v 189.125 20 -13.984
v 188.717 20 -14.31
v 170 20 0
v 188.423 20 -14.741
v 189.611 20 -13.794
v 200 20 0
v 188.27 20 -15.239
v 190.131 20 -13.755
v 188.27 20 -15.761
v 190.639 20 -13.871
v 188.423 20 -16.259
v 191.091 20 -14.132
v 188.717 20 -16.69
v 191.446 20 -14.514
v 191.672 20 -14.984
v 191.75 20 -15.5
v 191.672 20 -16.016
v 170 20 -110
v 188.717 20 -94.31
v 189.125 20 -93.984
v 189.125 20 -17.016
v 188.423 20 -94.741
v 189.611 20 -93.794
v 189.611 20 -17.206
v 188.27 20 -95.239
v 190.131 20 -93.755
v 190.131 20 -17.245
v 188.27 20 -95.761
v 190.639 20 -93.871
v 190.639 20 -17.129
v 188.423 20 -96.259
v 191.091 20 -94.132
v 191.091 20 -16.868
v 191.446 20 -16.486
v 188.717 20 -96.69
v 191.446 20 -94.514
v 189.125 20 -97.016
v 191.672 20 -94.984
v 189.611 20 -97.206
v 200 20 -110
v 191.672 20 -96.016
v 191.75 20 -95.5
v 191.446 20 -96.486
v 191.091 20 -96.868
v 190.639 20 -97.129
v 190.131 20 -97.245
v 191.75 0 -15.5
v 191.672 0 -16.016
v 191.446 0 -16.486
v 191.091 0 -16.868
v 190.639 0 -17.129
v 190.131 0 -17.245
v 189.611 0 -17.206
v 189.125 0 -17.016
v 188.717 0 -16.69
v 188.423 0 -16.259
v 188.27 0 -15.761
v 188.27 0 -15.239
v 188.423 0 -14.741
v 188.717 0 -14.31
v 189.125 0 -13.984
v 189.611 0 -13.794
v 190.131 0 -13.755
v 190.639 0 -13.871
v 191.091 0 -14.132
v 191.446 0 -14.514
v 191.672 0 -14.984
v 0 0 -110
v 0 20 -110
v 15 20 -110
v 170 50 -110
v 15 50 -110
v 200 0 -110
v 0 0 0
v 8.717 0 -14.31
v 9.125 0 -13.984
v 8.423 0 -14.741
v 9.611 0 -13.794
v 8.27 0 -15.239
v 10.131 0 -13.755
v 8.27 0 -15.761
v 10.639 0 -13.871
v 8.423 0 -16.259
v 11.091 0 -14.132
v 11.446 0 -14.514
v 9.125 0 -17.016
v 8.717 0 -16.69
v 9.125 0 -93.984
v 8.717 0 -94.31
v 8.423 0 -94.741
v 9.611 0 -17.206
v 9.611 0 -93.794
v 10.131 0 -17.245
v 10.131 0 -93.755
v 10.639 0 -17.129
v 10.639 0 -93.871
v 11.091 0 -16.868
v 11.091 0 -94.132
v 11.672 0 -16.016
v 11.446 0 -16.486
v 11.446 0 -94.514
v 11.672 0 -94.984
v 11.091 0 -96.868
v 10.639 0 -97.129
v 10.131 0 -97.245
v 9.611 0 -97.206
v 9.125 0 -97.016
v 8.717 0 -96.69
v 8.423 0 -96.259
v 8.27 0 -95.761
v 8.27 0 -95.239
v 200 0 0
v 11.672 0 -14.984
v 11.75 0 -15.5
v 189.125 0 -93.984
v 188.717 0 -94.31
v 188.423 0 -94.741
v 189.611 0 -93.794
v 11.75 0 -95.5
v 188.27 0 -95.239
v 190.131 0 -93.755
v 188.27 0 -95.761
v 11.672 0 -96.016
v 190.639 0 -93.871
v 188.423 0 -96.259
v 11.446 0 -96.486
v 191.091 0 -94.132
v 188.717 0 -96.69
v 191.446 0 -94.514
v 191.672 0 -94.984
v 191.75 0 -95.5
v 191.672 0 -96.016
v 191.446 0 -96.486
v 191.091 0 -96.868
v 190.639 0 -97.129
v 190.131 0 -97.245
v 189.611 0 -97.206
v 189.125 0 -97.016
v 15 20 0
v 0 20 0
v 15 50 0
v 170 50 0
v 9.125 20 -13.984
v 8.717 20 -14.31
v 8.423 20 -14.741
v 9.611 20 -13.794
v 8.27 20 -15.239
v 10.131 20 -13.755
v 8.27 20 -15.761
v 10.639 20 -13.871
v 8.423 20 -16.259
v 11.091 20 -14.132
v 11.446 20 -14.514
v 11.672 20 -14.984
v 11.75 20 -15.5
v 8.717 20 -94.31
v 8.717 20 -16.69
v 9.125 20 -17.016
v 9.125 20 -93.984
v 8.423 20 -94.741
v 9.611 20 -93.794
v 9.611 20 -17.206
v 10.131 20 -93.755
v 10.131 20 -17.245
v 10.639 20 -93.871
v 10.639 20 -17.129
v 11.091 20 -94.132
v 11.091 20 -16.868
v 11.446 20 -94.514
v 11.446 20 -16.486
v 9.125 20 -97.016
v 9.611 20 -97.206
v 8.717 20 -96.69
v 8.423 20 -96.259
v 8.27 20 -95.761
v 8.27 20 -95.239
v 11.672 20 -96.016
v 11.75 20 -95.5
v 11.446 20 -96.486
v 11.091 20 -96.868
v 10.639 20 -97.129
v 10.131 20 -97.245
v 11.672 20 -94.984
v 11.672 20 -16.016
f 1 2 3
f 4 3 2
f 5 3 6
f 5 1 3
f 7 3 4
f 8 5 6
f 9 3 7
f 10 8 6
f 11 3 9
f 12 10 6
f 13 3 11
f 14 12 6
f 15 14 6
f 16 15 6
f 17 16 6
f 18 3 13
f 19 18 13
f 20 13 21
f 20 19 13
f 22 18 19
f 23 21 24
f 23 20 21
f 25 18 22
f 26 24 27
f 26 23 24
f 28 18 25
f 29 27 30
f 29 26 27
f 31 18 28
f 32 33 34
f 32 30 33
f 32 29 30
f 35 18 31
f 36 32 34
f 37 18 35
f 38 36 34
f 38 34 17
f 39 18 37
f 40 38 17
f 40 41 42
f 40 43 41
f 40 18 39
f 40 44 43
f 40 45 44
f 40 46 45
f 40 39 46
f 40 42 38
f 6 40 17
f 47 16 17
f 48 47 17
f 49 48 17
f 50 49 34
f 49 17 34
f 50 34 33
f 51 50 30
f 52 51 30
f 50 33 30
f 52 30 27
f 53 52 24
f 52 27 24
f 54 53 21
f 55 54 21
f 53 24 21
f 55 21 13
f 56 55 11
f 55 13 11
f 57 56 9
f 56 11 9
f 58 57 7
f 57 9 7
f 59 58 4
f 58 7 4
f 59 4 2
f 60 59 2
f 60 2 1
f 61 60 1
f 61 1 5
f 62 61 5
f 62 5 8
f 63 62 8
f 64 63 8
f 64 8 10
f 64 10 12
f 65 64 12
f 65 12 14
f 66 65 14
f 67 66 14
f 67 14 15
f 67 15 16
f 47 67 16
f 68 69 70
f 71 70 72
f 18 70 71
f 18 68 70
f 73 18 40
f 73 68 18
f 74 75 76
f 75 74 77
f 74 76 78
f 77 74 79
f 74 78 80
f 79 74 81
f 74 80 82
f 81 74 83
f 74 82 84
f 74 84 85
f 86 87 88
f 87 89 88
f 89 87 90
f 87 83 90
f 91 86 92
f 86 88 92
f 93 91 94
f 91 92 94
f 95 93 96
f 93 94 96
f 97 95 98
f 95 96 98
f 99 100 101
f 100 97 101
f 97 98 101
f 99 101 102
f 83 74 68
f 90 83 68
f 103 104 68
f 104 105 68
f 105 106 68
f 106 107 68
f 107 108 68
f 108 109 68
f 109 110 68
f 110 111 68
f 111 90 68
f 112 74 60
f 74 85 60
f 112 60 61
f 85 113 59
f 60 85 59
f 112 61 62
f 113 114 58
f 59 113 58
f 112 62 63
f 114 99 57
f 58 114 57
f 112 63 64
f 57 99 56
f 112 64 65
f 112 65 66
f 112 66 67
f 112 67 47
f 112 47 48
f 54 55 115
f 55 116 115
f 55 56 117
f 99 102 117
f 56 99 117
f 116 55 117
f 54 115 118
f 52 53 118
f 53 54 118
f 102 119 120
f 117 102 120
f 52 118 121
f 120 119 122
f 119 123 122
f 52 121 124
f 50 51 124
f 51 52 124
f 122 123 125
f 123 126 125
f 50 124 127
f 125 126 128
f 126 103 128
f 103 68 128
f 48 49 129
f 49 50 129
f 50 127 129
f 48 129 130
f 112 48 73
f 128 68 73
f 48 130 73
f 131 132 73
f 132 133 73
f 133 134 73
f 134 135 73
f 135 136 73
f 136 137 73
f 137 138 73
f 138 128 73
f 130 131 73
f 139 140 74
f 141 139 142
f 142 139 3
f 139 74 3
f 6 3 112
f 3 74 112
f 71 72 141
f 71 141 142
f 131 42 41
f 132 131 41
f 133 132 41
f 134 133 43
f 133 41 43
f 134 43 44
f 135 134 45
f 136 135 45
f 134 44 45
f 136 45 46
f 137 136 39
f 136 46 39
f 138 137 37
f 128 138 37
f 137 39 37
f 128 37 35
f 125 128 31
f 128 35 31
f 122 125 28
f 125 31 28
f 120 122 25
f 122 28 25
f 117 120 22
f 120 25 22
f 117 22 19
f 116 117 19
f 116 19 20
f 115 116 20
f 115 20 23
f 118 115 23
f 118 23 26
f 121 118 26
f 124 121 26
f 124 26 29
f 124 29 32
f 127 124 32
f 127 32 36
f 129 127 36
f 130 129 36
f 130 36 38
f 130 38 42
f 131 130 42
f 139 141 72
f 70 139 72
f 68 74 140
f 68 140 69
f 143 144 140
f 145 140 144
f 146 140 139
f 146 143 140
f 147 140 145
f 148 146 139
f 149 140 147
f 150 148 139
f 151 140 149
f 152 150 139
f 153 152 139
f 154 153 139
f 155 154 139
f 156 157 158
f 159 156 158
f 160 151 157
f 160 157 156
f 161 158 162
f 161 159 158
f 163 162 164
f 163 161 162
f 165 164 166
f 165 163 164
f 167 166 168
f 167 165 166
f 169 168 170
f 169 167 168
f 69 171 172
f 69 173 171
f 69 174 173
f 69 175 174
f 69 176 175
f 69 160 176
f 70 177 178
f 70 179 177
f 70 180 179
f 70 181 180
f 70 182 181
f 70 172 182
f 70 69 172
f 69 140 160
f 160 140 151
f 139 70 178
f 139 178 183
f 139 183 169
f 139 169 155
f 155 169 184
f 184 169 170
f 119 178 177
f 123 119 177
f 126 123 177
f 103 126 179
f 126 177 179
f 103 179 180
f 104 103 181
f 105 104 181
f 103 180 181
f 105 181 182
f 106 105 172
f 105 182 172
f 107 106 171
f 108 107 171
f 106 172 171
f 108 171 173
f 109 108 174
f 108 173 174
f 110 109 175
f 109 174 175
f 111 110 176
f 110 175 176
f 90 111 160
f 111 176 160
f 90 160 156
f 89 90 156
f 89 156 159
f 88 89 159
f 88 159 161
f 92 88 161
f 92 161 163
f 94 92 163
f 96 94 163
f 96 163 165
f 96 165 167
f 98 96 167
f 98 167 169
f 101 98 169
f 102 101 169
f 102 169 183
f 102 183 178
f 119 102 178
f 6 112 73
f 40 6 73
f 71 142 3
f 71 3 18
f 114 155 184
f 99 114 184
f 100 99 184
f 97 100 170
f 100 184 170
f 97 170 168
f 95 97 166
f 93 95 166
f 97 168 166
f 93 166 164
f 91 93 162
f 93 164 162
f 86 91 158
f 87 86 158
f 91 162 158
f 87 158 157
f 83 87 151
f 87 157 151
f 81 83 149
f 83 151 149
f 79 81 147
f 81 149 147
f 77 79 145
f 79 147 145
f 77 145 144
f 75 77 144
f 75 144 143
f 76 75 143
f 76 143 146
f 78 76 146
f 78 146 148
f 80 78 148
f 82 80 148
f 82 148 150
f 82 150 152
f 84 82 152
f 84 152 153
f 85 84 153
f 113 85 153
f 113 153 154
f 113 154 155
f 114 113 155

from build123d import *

# Parameters (mm, degrees)
SKETCH1_W           = 200
SKETCH1_H           = 110
BOSS_EXTRUDE1_DEPTH = 50
SKETCH2_W           = 30
SKETCH2_H           = 110
SKETCH2_W_2         = 15
CUT_EXTRUDE1_DEPTH  = 30
SKETCH3_R           = 1.75
CUT_EXTRUDE2_DEPTH  = 30


with BuildPart() as part:
    # Sketch1 → Boss-Extrude1 (new body)
    with BuildSketch(Plane(origin=(0, 0, 0), x_dir=(1, 0, 0), z_dir=(0, 1, 0))):
        with Locations((100, 55)):
            Rectangle(SKETCH1_W, SKETCH1_H)
    extrude(amount=BOSS_EXTRUDE1_DEPTH)

    # Sketch2 → Cut-Extrude1 (cut)
    with BuildSketch(Plane(origin=(0, 50, 0), x_dir=(1, 0, 0), z_dir=(0, 1, 0))):
        with Locations((185, 55)):
            Rectangle(SKETCH2_W, SKETCH2_H)
        with Locations((7.5, 55)):
            Rectangle(SKETCH2_W_2, SKETCH2_H)
    extrude(amount=-CUT_EXTRUDE1_DEPTH, mode=Mode.SUBTRACT)

    # Sketch3 → Cut-Extrude2 (cut)
    with BuildSketch(Plane(origin=(0, 20, 0), x_dir=(1, 0, 0), z_dir=(0, 1, 0))):
        with Locations((190, 95.5)):
            Circle(SKETCH3_R)
        with Locations((190, 15.5)):
            Circle(SKETCH3_R)
        with Locations((10, 95.5)):
            Circle(SKETCH3_R)
        with Locations((10, 15.5)):
            Circle(SKETCH3_R)
    extrude(amount=-CUT_EXTRUDE2_DEPTH, mode=Mode.SUBTRACT)


solid = part.part
